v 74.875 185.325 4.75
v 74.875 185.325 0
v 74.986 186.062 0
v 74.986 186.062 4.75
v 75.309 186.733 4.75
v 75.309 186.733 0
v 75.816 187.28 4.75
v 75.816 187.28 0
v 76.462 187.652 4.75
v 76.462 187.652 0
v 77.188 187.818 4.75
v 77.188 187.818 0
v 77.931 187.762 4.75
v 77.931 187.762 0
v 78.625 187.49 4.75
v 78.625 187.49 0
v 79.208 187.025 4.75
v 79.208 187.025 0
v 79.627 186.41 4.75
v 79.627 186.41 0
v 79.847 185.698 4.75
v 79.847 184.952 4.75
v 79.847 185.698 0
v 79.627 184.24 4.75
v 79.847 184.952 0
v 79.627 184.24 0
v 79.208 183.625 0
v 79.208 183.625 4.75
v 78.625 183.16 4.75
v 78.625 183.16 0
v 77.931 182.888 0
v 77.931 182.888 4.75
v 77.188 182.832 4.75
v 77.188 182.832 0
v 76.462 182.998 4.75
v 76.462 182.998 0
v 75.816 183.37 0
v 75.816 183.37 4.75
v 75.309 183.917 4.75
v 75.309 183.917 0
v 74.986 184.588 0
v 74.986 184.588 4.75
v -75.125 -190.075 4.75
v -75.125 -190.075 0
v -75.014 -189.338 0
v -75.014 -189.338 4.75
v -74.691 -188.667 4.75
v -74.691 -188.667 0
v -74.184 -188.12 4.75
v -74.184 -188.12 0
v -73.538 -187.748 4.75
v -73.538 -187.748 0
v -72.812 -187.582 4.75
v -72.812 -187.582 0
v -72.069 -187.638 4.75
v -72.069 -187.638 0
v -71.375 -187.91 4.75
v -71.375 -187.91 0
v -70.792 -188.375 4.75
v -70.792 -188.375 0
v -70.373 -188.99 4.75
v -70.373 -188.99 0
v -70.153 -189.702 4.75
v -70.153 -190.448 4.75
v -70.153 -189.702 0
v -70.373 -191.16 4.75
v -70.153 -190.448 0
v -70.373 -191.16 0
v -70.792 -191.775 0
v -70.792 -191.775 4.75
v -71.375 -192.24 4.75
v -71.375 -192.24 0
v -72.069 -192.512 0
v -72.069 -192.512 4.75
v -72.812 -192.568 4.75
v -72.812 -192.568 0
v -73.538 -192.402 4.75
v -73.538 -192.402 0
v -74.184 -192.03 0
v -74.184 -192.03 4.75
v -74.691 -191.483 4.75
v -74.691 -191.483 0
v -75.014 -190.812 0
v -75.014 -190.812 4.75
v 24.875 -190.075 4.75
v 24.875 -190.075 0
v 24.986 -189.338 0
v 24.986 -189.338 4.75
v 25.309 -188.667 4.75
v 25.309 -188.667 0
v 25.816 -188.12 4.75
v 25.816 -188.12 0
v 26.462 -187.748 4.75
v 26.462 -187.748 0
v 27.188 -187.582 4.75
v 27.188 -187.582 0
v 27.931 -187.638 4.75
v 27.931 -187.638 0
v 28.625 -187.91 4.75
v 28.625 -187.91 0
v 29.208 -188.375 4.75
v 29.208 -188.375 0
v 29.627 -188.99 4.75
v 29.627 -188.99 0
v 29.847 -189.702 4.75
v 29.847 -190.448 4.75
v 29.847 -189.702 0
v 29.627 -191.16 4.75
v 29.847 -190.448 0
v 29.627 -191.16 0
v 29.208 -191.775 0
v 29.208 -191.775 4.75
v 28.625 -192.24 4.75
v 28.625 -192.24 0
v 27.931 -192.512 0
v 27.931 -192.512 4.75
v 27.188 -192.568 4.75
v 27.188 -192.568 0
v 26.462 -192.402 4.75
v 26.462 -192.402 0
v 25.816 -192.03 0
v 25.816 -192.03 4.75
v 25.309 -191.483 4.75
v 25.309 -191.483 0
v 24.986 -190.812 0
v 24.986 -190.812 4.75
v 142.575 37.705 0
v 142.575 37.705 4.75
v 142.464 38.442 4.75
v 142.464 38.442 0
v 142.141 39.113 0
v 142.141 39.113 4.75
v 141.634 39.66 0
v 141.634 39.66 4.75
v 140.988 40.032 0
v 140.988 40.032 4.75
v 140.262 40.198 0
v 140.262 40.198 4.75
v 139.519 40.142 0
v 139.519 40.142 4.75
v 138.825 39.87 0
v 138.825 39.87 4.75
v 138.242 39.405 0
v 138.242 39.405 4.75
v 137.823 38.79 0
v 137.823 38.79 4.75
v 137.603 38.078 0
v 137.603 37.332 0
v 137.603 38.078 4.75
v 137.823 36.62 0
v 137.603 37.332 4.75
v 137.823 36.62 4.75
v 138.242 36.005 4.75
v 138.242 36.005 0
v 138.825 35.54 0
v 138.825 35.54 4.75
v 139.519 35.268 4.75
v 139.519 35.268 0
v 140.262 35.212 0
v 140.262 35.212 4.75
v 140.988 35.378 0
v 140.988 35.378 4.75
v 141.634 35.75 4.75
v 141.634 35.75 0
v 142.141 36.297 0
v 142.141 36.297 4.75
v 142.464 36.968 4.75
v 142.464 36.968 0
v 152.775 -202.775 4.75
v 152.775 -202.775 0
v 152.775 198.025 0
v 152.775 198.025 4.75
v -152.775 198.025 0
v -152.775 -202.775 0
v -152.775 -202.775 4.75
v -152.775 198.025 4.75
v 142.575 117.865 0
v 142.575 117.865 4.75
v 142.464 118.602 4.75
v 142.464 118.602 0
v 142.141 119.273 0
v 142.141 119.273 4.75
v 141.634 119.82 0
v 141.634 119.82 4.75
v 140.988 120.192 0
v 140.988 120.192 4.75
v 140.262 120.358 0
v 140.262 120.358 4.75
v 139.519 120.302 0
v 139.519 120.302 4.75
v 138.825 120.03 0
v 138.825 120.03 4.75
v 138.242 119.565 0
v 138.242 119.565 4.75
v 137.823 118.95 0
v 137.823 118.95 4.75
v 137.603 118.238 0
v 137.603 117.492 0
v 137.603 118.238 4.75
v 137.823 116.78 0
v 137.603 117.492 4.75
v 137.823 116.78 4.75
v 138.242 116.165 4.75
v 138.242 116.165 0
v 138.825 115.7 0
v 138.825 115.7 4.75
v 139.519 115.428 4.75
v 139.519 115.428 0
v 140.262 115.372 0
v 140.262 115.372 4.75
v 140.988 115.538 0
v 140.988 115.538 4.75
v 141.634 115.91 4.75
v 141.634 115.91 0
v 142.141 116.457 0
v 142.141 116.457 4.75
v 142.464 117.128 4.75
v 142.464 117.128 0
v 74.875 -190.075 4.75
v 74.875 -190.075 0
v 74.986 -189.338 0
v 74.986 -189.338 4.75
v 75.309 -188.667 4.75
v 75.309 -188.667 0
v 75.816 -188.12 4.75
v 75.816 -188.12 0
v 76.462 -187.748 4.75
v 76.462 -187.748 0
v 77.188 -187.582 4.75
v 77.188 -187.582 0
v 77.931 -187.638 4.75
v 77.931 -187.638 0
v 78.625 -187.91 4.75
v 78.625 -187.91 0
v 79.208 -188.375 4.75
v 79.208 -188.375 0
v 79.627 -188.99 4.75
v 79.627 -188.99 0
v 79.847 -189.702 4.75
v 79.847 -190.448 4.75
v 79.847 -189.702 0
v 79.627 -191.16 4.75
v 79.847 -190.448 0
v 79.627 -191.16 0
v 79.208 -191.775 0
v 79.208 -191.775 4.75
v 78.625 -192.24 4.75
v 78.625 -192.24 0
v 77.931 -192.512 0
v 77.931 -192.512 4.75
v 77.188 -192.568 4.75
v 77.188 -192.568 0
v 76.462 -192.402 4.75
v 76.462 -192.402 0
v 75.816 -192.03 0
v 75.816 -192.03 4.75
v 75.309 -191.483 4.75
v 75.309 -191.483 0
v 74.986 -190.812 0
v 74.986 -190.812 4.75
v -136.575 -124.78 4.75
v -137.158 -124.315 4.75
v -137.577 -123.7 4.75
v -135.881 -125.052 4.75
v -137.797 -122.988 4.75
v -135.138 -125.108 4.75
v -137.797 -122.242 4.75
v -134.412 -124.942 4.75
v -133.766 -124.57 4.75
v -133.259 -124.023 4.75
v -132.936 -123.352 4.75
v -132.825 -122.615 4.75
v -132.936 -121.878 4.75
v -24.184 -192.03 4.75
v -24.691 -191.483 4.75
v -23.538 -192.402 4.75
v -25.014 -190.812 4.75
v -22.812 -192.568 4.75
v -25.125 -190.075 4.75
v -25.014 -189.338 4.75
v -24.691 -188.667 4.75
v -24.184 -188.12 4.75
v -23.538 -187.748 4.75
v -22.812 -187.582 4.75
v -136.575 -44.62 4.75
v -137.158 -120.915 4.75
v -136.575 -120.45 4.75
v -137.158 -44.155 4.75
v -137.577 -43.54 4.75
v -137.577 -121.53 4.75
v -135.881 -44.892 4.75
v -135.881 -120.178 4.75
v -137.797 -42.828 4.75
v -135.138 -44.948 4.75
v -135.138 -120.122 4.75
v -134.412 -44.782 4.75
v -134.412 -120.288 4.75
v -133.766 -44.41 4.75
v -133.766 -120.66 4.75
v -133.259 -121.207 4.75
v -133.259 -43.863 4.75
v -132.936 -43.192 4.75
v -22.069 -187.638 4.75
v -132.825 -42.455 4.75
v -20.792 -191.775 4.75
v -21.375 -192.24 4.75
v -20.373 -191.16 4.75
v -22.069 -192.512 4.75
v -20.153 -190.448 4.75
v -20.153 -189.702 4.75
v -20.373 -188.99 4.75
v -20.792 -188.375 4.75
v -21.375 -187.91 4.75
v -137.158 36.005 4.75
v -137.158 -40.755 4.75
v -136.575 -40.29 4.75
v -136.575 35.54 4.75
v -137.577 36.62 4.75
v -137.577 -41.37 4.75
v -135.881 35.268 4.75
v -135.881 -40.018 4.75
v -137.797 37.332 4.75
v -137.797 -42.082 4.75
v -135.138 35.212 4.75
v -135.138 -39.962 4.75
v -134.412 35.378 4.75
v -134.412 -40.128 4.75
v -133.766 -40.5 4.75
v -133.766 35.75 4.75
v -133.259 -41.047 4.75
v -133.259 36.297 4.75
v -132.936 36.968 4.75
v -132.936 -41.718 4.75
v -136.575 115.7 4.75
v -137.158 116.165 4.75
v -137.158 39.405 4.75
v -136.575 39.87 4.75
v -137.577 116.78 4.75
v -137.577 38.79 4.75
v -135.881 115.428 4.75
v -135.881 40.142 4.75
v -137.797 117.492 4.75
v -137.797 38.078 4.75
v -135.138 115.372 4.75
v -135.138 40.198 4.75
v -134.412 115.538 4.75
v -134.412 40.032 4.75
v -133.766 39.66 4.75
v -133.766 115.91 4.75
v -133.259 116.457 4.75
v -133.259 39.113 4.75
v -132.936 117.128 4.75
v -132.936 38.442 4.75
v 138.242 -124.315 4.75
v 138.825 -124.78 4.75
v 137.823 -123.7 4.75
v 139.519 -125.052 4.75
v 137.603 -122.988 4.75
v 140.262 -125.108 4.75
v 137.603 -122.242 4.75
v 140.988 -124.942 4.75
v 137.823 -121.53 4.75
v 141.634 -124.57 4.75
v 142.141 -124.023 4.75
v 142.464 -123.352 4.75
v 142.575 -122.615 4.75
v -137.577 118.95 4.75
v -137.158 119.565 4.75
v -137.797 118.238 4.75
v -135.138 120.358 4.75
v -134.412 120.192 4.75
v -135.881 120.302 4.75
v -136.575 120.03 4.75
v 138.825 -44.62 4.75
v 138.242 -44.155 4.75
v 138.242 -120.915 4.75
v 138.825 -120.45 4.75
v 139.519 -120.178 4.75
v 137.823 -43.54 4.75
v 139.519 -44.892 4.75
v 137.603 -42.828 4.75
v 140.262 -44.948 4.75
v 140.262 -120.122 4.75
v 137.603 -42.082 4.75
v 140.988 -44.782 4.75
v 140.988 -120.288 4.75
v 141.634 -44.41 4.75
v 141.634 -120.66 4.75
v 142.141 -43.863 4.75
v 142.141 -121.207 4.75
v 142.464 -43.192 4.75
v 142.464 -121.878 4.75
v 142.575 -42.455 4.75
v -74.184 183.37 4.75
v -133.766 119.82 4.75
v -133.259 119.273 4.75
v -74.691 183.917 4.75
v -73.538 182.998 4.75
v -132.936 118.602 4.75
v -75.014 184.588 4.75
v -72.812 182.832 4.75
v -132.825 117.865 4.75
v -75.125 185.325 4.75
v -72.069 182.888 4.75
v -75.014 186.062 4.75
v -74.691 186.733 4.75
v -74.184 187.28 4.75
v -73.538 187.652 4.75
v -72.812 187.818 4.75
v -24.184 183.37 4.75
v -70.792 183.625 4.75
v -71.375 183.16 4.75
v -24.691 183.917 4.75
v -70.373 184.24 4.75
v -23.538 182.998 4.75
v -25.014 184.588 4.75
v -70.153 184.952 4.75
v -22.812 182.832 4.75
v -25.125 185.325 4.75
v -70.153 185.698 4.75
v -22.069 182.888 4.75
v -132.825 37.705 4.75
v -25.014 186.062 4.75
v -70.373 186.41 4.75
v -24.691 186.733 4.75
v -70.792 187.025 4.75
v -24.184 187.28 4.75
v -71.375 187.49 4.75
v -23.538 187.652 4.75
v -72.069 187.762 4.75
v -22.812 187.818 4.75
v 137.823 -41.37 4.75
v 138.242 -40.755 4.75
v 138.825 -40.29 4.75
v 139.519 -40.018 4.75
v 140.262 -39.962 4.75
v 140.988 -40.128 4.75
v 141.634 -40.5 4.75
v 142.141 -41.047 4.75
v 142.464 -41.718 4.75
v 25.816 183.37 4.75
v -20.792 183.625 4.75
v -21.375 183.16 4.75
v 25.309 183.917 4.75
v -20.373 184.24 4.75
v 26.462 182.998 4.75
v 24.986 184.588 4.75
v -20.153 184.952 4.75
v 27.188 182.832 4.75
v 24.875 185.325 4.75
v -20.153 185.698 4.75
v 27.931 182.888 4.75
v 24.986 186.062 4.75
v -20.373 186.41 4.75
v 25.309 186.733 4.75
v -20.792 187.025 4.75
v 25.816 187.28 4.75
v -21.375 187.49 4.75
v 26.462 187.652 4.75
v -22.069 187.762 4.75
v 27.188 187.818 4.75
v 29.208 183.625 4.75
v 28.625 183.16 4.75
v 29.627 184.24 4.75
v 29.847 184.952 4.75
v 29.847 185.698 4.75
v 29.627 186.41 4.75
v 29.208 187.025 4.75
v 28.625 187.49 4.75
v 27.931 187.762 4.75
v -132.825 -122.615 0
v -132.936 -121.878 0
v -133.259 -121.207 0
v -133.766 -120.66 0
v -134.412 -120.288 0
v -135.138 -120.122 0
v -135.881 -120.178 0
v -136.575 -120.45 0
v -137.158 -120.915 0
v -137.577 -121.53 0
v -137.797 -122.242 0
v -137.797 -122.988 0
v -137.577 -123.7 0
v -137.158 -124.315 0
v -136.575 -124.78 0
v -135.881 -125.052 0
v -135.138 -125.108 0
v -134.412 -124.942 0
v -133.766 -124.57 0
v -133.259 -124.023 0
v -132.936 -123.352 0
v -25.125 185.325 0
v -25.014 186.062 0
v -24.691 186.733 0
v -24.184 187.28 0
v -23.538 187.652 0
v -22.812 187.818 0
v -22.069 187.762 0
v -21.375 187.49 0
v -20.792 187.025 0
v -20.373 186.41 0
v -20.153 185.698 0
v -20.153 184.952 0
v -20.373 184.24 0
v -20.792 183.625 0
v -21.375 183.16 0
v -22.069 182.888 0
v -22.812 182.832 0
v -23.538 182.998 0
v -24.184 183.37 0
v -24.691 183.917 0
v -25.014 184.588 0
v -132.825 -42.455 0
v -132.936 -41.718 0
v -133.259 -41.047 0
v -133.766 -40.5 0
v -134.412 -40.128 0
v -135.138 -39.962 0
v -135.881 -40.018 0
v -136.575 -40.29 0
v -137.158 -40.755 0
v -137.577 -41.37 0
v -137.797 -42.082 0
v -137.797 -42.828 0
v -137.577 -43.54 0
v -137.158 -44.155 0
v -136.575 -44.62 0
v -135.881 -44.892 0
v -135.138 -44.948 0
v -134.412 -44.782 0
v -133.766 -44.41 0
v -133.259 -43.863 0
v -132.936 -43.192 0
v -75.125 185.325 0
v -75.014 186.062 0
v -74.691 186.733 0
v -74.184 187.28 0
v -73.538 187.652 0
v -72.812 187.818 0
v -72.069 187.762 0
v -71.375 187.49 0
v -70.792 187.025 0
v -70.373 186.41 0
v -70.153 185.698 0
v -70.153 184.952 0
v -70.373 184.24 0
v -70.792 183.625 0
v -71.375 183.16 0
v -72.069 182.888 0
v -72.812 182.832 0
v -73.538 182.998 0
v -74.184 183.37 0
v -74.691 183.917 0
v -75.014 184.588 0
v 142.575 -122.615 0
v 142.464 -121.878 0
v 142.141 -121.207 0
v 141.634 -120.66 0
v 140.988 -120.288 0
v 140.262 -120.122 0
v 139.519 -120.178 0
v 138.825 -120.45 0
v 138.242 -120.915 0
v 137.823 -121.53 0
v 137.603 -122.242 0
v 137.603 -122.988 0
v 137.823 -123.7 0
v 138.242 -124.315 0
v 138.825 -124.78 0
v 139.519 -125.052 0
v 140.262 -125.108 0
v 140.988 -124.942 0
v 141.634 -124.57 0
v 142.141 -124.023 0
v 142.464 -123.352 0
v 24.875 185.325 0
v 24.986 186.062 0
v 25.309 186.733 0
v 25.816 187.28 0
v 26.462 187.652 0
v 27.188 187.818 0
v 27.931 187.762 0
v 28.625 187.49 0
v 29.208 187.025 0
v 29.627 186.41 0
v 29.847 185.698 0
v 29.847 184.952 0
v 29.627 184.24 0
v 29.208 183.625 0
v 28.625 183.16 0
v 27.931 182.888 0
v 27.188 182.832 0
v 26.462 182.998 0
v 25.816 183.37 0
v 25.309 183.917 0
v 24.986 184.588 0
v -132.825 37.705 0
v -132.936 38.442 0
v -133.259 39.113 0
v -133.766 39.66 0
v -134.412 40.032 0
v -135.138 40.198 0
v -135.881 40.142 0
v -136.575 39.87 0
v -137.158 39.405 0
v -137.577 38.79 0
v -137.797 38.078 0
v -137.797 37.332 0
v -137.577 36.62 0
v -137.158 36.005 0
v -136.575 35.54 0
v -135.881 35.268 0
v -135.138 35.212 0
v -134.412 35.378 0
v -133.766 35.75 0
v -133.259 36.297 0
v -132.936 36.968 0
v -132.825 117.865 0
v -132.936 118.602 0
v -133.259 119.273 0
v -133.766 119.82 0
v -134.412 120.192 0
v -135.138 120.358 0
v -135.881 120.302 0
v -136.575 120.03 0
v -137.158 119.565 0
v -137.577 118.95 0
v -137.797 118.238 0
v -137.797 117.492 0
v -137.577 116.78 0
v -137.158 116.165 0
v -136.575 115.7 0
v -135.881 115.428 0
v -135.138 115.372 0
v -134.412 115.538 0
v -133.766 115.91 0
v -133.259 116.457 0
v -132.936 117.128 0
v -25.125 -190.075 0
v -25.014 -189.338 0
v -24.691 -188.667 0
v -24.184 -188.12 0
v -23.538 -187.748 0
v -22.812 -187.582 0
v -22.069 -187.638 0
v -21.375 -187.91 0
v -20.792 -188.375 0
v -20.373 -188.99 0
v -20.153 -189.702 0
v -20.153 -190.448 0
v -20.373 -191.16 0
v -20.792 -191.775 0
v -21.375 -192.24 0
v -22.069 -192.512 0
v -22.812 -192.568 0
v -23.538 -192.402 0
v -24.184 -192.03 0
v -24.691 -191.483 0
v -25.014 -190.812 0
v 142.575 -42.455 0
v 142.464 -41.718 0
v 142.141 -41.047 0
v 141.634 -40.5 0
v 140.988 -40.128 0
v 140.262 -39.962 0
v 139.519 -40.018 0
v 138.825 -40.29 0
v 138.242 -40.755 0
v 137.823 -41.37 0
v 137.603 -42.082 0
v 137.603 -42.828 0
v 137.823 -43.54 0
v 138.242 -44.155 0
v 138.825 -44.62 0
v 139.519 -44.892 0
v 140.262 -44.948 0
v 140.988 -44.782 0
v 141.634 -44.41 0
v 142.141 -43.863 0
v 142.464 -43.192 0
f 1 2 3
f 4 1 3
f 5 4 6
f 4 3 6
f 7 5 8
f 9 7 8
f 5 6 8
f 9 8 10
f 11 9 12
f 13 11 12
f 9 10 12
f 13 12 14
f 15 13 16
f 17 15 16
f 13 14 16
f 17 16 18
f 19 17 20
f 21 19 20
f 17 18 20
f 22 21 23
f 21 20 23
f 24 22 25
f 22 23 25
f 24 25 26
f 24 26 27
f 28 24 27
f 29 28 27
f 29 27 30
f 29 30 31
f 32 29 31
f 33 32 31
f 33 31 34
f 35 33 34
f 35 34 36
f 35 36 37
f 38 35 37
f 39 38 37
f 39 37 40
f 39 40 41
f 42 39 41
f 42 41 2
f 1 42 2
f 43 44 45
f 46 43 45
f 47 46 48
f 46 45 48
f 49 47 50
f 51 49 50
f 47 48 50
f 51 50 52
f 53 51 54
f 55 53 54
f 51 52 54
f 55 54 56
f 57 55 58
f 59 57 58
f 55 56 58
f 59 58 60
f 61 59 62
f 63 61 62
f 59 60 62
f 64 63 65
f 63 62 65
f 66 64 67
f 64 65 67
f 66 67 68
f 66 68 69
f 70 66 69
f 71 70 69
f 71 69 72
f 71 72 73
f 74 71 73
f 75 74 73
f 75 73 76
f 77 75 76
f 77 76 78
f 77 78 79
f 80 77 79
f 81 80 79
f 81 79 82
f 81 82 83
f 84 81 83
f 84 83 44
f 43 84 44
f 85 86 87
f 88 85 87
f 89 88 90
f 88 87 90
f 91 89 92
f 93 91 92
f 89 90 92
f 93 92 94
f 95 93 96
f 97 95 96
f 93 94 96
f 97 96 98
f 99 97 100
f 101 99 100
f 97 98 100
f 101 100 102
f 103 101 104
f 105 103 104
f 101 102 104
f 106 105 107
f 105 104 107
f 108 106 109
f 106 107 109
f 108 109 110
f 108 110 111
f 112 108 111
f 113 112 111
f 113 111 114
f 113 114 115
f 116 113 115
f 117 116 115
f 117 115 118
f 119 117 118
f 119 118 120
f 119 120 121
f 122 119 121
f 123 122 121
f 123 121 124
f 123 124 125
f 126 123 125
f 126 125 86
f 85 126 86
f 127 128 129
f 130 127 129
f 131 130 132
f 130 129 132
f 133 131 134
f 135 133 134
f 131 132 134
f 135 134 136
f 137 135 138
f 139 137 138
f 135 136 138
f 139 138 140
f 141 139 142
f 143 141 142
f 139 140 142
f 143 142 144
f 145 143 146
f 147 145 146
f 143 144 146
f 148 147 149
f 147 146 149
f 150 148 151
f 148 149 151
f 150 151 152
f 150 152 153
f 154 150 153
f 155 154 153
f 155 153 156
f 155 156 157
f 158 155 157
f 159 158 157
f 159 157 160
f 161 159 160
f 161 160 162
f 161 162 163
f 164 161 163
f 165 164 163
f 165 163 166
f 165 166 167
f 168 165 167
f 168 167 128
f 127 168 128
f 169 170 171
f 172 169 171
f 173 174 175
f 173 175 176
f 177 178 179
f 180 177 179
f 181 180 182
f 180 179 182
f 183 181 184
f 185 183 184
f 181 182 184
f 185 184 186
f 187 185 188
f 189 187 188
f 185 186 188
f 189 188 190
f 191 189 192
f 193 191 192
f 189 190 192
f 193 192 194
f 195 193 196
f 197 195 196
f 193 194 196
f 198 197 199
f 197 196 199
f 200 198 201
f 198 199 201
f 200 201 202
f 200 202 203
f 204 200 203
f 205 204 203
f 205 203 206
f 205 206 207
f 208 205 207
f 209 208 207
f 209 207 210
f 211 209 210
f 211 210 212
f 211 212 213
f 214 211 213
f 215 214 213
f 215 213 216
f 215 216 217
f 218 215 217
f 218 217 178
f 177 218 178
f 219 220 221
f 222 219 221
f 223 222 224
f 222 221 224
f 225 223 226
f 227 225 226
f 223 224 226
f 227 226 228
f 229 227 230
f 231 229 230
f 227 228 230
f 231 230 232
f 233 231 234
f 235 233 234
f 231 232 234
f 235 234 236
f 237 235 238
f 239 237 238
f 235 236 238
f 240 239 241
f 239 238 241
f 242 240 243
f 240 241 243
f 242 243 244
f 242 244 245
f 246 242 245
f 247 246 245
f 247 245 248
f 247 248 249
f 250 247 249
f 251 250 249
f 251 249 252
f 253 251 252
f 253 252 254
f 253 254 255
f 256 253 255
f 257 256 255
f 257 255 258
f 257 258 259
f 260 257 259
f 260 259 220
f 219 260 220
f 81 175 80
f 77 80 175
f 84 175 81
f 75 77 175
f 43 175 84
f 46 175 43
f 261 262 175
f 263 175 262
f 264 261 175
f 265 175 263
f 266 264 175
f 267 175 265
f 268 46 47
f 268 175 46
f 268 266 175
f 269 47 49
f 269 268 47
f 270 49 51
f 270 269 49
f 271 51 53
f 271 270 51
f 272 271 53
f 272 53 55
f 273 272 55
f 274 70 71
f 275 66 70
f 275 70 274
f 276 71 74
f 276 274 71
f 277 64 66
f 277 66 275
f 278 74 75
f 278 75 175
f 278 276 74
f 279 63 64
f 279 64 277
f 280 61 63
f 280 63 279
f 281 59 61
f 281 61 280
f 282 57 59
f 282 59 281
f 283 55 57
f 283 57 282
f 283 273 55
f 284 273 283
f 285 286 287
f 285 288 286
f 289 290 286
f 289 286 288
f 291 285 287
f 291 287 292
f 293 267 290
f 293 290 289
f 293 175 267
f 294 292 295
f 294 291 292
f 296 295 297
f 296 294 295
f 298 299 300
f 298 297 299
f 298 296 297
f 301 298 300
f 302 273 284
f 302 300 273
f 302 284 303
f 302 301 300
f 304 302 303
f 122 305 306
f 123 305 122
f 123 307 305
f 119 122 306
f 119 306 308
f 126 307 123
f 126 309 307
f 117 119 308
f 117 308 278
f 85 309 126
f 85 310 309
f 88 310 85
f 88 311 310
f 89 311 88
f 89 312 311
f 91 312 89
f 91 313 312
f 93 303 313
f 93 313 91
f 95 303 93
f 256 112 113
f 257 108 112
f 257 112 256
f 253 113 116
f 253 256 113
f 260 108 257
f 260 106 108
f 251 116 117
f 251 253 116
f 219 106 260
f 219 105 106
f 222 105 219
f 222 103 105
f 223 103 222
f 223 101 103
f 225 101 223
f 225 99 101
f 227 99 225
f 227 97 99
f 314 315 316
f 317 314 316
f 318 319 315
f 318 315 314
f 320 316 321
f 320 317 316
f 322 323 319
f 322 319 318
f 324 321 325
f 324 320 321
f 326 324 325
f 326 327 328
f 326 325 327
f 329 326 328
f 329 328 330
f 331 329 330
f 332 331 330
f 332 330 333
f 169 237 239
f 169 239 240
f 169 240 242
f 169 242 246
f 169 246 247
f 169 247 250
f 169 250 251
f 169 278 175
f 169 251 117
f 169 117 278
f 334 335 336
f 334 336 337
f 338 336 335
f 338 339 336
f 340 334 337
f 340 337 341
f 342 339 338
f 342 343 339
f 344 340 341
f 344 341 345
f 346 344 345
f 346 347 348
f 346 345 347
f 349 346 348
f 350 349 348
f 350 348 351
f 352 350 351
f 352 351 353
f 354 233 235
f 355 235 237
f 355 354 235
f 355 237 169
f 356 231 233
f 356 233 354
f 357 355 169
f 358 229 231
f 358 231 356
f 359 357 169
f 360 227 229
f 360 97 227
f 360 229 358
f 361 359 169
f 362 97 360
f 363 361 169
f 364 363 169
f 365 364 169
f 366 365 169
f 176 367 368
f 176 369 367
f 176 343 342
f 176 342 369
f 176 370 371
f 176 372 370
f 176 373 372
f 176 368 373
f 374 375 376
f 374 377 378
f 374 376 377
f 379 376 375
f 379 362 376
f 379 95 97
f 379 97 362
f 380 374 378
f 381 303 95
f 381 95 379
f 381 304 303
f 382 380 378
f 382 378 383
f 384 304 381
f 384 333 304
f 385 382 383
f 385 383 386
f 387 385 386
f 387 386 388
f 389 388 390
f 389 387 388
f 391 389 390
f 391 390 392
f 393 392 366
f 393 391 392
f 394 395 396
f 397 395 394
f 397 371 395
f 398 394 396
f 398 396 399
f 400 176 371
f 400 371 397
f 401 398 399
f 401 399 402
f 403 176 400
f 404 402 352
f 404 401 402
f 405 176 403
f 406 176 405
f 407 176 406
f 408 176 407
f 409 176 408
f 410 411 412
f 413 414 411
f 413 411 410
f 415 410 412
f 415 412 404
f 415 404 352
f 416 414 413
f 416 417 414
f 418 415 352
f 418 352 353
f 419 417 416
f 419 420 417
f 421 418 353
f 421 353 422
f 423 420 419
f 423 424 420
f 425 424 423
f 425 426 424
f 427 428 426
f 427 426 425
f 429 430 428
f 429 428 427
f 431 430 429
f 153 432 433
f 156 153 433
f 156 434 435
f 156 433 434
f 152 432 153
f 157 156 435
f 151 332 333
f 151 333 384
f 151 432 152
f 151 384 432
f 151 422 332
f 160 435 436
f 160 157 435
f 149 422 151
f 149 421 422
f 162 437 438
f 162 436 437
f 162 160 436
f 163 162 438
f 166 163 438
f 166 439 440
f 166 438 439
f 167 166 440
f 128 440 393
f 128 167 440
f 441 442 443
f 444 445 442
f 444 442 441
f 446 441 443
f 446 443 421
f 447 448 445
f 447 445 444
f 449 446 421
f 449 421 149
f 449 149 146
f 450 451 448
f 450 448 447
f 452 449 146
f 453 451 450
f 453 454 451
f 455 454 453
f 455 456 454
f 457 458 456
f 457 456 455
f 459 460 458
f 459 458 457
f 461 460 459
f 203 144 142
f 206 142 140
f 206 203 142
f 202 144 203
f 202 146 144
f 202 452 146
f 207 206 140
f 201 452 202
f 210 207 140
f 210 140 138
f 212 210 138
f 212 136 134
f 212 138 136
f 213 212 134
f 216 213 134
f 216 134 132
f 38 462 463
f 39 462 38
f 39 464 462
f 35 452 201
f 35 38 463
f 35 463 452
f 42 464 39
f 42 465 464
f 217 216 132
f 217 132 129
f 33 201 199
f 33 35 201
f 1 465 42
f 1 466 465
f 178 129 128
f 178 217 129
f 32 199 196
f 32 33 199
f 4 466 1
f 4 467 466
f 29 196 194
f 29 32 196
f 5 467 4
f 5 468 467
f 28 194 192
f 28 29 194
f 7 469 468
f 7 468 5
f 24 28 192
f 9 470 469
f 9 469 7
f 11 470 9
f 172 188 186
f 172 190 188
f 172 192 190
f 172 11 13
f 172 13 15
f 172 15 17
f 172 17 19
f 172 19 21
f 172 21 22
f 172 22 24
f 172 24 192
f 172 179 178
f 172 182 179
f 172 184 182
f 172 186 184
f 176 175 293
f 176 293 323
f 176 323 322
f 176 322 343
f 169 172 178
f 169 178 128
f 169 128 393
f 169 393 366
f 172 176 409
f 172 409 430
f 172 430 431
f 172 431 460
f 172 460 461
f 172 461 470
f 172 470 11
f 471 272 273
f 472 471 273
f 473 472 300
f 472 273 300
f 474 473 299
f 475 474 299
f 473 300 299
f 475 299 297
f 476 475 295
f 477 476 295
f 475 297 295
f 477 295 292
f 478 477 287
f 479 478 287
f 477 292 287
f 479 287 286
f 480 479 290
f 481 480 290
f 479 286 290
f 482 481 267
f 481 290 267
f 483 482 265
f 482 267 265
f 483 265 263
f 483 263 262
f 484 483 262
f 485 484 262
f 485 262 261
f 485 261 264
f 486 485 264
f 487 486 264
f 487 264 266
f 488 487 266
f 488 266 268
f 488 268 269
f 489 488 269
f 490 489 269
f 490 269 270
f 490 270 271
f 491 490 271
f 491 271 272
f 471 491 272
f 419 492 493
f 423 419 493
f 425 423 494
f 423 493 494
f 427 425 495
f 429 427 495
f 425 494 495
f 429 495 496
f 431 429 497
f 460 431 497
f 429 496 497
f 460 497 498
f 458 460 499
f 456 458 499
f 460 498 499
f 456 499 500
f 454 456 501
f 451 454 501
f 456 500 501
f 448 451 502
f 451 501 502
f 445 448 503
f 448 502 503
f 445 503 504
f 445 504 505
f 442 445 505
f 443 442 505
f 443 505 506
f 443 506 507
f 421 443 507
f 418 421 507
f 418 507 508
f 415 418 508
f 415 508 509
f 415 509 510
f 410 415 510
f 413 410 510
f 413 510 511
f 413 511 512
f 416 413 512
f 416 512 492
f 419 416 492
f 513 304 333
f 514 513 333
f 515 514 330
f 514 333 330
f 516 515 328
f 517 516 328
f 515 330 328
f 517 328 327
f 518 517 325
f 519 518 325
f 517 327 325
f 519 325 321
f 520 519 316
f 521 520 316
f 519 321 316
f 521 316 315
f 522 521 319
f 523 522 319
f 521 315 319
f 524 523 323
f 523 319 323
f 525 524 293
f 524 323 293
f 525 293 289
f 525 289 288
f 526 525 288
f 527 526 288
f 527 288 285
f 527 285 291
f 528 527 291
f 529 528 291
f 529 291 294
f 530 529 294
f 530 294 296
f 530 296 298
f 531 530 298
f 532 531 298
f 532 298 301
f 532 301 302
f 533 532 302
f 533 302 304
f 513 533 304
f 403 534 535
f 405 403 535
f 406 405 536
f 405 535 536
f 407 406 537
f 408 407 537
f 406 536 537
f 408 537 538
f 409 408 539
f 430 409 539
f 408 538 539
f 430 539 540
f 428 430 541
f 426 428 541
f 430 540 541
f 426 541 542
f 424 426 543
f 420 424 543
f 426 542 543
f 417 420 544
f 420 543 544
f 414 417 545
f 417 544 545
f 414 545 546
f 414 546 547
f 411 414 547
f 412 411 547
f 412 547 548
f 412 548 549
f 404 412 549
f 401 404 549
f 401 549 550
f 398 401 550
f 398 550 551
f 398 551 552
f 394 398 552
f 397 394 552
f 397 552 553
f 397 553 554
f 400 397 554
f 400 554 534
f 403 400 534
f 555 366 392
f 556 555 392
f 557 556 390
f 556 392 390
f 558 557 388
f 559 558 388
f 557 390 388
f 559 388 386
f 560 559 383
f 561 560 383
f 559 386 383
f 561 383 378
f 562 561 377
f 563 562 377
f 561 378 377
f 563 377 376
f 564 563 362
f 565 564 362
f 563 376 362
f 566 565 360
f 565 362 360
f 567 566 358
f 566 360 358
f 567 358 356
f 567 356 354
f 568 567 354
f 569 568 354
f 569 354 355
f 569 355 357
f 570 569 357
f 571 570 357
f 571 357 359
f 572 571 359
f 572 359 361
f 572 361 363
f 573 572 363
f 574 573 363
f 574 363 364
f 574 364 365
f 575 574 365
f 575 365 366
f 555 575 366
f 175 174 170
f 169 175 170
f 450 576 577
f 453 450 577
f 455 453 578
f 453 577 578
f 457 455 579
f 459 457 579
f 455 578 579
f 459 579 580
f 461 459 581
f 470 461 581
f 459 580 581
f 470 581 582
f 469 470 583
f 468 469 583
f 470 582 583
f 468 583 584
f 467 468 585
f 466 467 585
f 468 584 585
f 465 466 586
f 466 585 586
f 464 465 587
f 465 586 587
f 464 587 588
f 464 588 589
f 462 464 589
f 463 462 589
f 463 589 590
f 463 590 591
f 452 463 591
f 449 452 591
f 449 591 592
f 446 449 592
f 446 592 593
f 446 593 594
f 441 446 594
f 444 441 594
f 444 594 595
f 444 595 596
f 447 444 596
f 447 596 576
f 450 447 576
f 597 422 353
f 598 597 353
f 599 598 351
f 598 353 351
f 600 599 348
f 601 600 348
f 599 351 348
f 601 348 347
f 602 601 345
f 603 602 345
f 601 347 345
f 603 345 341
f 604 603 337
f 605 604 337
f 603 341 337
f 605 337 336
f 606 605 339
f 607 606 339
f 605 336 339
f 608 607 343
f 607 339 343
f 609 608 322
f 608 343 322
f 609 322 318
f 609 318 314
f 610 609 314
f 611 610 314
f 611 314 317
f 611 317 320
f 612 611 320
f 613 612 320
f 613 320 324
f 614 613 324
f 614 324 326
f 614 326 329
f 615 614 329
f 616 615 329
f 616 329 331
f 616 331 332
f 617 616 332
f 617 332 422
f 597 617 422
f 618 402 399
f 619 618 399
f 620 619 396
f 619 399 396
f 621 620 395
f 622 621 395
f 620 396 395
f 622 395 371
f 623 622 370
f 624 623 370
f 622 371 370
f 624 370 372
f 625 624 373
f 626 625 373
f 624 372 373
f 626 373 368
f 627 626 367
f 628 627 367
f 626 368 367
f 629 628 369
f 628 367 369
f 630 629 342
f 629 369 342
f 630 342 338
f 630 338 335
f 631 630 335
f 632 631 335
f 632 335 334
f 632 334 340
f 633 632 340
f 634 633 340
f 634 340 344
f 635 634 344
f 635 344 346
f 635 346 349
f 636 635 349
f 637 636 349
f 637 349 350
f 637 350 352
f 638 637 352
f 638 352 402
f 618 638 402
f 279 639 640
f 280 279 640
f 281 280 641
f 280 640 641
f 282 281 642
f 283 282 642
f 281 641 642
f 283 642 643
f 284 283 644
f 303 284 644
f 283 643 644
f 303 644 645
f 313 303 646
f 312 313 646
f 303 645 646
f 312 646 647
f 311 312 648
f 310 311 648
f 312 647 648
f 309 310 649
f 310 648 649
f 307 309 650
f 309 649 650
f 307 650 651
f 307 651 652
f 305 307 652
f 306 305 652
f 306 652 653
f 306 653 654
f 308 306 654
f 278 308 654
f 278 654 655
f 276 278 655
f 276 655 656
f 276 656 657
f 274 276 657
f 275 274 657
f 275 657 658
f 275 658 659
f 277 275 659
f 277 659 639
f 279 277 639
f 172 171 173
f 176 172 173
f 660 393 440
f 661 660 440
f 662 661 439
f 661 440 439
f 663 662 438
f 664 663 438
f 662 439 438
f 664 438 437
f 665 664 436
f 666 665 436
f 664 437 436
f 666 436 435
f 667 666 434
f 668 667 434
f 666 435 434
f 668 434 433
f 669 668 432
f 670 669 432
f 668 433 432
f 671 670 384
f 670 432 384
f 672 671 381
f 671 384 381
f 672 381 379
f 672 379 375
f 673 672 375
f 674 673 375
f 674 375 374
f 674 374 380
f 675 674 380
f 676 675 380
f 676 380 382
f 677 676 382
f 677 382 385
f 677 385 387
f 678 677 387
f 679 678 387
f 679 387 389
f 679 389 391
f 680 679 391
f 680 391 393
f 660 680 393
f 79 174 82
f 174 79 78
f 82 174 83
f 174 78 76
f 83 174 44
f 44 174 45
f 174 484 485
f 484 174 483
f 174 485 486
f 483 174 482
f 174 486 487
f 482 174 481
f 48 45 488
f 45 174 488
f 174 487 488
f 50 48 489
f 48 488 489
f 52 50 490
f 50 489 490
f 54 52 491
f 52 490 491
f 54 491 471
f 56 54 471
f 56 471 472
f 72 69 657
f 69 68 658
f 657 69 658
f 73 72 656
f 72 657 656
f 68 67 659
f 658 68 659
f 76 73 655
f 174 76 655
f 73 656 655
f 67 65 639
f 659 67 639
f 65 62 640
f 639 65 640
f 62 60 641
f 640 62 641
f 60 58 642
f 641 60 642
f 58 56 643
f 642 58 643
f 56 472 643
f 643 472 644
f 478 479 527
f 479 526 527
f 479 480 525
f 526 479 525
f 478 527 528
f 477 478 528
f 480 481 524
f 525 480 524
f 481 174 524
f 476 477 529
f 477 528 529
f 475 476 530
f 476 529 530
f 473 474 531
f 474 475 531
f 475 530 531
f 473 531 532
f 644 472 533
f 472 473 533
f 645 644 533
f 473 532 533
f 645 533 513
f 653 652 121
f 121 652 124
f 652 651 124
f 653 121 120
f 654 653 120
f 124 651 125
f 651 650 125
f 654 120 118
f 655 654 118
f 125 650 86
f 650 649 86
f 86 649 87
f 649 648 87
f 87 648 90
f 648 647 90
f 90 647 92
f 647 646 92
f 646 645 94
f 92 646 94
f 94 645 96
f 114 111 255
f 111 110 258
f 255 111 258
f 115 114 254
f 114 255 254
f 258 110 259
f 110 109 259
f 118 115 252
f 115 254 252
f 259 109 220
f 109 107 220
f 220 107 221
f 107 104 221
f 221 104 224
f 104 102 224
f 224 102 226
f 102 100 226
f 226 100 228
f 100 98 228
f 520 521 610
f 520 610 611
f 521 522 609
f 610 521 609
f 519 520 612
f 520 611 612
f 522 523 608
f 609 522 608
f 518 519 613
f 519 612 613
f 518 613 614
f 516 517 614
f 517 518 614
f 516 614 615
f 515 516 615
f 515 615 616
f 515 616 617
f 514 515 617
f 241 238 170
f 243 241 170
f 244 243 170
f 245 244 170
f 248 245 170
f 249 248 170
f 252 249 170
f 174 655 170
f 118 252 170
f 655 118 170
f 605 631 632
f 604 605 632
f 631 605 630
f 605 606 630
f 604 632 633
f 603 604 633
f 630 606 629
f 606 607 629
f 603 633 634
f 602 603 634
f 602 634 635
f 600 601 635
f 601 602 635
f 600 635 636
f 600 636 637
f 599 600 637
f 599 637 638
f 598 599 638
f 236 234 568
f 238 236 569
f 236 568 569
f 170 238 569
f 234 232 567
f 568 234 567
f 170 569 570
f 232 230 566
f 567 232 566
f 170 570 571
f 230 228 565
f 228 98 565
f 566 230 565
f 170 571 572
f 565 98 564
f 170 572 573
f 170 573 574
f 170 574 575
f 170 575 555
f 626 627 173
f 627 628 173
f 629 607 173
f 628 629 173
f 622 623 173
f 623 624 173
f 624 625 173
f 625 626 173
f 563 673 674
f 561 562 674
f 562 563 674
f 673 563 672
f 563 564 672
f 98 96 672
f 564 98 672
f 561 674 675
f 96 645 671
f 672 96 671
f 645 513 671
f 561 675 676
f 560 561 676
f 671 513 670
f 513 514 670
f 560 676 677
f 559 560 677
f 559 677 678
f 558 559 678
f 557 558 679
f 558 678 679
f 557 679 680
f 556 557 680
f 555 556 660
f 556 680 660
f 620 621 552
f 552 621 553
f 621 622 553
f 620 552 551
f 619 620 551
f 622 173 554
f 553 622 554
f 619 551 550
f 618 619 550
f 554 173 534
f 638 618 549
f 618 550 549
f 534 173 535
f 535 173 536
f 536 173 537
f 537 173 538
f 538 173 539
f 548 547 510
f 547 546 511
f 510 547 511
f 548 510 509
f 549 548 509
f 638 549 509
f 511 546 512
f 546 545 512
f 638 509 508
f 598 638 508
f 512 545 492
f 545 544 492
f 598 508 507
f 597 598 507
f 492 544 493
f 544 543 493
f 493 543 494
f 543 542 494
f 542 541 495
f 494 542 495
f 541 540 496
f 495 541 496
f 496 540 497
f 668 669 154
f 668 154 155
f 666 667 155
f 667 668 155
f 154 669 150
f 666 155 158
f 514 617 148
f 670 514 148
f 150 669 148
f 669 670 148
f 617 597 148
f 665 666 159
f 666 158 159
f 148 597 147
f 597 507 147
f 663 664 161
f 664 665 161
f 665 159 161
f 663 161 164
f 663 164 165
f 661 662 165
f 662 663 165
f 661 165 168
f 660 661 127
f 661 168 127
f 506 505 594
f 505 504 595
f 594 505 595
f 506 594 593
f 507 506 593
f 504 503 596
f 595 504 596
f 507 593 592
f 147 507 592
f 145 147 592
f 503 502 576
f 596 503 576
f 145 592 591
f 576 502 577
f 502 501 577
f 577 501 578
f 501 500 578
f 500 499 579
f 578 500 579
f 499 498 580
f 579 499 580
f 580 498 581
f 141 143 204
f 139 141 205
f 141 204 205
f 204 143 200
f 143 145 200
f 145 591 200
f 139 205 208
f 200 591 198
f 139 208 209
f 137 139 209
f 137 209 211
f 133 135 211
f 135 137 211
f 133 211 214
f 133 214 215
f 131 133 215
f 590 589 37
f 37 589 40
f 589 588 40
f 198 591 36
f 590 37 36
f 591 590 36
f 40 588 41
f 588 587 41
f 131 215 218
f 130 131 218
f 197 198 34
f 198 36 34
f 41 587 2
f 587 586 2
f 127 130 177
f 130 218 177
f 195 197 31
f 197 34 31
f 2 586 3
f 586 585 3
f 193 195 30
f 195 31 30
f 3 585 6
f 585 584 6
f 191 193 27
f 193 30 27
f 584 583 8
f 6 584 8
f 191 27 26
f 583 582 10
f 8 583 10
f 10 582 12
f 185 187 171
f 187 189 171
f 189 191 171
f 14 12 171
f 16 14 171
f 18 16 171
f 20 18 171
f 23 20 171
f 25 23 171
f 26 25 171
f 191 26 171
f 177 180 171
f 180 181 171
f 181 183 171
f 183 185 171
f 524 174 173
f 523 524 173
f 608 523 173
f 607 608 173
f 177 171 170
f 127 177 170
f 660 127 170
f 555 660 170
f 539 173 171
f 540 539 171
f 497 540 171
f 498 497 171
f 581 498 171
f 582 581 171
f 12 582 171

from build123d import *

# Parameters (mm, degrees)
SKETCH_1_W                     = 305.55
SKETCH_1_H                     = 405.55
EXTRUDE_1_DEPTH                = 4.75
SKETCH_3_R                     = 2.5
CUT_EXTRUDE_1_DEPTH            = 10
SKETCH_5_R                     = 2.5
CUT_EXTRUDE_3_DEPTH            = 10
SKETCH_6_R                     = 2.5
CUT_EXTRUDE_4_DEPTH            = 10
SKETCH_7_R                     = 2.5
CUT_EXTRUDE_5_DEPTH            = 10
SPLIT_BODIES_1_SURFACE_1_BACK  = 508.793
SPLIT_BODIES_1_SURFACE_1_DEPTH = 1017.586


with BuildPart() as part:
    # 草圖1 → 填料-伸長1 (new body)
    with BuildSketch(Plane.XY):
        Rectangle(SKETCH_1_W, SKETCH_1_H)
    extrude(amount=EXTRUDE_1_DEPTH)

    # 草圖3 → 除料-伸長1 (cut)
    with BuildSketch(Plane.XY.offset(4.75)):
        with Locations((140.075, 37.705)):
            Circle(SKETCH_3_R)
        with Locations((140.075, 117.865)):
            Circle(SKETCH_3_R)
        with Locations((140.075, -42.455)):
            Circle(SKETCH_3_R)
        with Locations((140.075, -122.615)):
            Circle(SKETCH_3_R)
    extrude(amount=-CUT_EXTRUDE_1_DEPTH, mode=Mode.SUBTRACT)

    # 草圖5 → 除料-伸長3 (cut)
    with BuildSketch(Plane.XY.offset(4.75)):
        with Locations((-135.325, -122.615)):
            Circle(SKETCH_5_R)
        with Locations((-135.325, -42.455)):
            Circle(SKETCH_5_R)
        with Locations((-135.325, 37.705)):
            Circle(SKETCH_5_R)
        with Locations((-135.325, 117.865)):
            Circle(SKETCH_5_R)
    extrude(amount=-CUT_EXTRUDE_3_DEPTH, mode=Mode.SUBTRACT)

    # 草圖6 → 除料-伸長4 (cut)
    with BuildSketch(Plane(origin=(0, 0, 0), x_dir=(-1, 0, 0), z_dir=(0, 0, -1))):
        with Locations((22.625, 185.325)):
            Circle(SKETCH_6_R)
        with Locations((72.625, 185.325)):
            Circle(SKETCH_6_R)
        with Locations((-77.375, 185.325)):
            Circle(SKETCH_6_R)
        with Locations((-27.375, 185.325)):
            Circle(SKETCH_6_R)
    extrude(amount=-CUT_EXTRUDE_4_DEPTH, mode=Mode.SUBTRACT)

    # 草圖7 → 除料-伸長5 (cut)
    with BuildSketch(Plane(origin=(0, 0, 0), x_dir=(-1, 0, 0), z_dir=(0, 0, -1))):
        with Locations((-77.375, -190.075)):
            Circle(SKETCH_7_R)
        with Locations((-27.375, -190.075)):
            Circle(SKETCH_7_R)
        with Locations((22.625, -190.075)):
            Circle(SKETCH_7_R)
        with Locations((72.625, -190.075)):
            Circle(SKETCH_7_R)
    extrude(amount=-CUT_EXTRUDE_5_DEPTH, mode=Mode.SUBTRACT)

    # Split Bodies 1: cut with a surface, the side it looks to stays
    # Split Bodies 1 surface: a surface, the sketch's curves swept straight by 1017.586 mm
    with BuildLine(Plane.XY.offset(4.75).offset(-SPLIT_BODIES_1_SURFACE_1_BACK), mode=Mode.PRIVATE) as split_bodies_1_surface_1_path:
        Line((-152.775, 202.775), (152.775, 202.775))
        Line((152.775, 202.775), (152.775, 198.025))
        Line((152.775, 198.025), (-152.775, 198.025))
        Line((-152.775, 198.025), (-152.775, 202.775))
    split_bodies_1_surface_1 = Shell.extrude(split_bodies_1_surface_1_path.wire(), (0 * SPLIT_BODIES_1_SURFACE_1_DEPTH, 0 * SPLIT_BODIES_1_SURFACE_1_DEPTH, 1 * SPLIT_BODIES_1_SURFACE_1_DEPTH))
    split(bisect_by=split_bodies_1_surface_1, keep=Keep.TOP)


solid = part.part
